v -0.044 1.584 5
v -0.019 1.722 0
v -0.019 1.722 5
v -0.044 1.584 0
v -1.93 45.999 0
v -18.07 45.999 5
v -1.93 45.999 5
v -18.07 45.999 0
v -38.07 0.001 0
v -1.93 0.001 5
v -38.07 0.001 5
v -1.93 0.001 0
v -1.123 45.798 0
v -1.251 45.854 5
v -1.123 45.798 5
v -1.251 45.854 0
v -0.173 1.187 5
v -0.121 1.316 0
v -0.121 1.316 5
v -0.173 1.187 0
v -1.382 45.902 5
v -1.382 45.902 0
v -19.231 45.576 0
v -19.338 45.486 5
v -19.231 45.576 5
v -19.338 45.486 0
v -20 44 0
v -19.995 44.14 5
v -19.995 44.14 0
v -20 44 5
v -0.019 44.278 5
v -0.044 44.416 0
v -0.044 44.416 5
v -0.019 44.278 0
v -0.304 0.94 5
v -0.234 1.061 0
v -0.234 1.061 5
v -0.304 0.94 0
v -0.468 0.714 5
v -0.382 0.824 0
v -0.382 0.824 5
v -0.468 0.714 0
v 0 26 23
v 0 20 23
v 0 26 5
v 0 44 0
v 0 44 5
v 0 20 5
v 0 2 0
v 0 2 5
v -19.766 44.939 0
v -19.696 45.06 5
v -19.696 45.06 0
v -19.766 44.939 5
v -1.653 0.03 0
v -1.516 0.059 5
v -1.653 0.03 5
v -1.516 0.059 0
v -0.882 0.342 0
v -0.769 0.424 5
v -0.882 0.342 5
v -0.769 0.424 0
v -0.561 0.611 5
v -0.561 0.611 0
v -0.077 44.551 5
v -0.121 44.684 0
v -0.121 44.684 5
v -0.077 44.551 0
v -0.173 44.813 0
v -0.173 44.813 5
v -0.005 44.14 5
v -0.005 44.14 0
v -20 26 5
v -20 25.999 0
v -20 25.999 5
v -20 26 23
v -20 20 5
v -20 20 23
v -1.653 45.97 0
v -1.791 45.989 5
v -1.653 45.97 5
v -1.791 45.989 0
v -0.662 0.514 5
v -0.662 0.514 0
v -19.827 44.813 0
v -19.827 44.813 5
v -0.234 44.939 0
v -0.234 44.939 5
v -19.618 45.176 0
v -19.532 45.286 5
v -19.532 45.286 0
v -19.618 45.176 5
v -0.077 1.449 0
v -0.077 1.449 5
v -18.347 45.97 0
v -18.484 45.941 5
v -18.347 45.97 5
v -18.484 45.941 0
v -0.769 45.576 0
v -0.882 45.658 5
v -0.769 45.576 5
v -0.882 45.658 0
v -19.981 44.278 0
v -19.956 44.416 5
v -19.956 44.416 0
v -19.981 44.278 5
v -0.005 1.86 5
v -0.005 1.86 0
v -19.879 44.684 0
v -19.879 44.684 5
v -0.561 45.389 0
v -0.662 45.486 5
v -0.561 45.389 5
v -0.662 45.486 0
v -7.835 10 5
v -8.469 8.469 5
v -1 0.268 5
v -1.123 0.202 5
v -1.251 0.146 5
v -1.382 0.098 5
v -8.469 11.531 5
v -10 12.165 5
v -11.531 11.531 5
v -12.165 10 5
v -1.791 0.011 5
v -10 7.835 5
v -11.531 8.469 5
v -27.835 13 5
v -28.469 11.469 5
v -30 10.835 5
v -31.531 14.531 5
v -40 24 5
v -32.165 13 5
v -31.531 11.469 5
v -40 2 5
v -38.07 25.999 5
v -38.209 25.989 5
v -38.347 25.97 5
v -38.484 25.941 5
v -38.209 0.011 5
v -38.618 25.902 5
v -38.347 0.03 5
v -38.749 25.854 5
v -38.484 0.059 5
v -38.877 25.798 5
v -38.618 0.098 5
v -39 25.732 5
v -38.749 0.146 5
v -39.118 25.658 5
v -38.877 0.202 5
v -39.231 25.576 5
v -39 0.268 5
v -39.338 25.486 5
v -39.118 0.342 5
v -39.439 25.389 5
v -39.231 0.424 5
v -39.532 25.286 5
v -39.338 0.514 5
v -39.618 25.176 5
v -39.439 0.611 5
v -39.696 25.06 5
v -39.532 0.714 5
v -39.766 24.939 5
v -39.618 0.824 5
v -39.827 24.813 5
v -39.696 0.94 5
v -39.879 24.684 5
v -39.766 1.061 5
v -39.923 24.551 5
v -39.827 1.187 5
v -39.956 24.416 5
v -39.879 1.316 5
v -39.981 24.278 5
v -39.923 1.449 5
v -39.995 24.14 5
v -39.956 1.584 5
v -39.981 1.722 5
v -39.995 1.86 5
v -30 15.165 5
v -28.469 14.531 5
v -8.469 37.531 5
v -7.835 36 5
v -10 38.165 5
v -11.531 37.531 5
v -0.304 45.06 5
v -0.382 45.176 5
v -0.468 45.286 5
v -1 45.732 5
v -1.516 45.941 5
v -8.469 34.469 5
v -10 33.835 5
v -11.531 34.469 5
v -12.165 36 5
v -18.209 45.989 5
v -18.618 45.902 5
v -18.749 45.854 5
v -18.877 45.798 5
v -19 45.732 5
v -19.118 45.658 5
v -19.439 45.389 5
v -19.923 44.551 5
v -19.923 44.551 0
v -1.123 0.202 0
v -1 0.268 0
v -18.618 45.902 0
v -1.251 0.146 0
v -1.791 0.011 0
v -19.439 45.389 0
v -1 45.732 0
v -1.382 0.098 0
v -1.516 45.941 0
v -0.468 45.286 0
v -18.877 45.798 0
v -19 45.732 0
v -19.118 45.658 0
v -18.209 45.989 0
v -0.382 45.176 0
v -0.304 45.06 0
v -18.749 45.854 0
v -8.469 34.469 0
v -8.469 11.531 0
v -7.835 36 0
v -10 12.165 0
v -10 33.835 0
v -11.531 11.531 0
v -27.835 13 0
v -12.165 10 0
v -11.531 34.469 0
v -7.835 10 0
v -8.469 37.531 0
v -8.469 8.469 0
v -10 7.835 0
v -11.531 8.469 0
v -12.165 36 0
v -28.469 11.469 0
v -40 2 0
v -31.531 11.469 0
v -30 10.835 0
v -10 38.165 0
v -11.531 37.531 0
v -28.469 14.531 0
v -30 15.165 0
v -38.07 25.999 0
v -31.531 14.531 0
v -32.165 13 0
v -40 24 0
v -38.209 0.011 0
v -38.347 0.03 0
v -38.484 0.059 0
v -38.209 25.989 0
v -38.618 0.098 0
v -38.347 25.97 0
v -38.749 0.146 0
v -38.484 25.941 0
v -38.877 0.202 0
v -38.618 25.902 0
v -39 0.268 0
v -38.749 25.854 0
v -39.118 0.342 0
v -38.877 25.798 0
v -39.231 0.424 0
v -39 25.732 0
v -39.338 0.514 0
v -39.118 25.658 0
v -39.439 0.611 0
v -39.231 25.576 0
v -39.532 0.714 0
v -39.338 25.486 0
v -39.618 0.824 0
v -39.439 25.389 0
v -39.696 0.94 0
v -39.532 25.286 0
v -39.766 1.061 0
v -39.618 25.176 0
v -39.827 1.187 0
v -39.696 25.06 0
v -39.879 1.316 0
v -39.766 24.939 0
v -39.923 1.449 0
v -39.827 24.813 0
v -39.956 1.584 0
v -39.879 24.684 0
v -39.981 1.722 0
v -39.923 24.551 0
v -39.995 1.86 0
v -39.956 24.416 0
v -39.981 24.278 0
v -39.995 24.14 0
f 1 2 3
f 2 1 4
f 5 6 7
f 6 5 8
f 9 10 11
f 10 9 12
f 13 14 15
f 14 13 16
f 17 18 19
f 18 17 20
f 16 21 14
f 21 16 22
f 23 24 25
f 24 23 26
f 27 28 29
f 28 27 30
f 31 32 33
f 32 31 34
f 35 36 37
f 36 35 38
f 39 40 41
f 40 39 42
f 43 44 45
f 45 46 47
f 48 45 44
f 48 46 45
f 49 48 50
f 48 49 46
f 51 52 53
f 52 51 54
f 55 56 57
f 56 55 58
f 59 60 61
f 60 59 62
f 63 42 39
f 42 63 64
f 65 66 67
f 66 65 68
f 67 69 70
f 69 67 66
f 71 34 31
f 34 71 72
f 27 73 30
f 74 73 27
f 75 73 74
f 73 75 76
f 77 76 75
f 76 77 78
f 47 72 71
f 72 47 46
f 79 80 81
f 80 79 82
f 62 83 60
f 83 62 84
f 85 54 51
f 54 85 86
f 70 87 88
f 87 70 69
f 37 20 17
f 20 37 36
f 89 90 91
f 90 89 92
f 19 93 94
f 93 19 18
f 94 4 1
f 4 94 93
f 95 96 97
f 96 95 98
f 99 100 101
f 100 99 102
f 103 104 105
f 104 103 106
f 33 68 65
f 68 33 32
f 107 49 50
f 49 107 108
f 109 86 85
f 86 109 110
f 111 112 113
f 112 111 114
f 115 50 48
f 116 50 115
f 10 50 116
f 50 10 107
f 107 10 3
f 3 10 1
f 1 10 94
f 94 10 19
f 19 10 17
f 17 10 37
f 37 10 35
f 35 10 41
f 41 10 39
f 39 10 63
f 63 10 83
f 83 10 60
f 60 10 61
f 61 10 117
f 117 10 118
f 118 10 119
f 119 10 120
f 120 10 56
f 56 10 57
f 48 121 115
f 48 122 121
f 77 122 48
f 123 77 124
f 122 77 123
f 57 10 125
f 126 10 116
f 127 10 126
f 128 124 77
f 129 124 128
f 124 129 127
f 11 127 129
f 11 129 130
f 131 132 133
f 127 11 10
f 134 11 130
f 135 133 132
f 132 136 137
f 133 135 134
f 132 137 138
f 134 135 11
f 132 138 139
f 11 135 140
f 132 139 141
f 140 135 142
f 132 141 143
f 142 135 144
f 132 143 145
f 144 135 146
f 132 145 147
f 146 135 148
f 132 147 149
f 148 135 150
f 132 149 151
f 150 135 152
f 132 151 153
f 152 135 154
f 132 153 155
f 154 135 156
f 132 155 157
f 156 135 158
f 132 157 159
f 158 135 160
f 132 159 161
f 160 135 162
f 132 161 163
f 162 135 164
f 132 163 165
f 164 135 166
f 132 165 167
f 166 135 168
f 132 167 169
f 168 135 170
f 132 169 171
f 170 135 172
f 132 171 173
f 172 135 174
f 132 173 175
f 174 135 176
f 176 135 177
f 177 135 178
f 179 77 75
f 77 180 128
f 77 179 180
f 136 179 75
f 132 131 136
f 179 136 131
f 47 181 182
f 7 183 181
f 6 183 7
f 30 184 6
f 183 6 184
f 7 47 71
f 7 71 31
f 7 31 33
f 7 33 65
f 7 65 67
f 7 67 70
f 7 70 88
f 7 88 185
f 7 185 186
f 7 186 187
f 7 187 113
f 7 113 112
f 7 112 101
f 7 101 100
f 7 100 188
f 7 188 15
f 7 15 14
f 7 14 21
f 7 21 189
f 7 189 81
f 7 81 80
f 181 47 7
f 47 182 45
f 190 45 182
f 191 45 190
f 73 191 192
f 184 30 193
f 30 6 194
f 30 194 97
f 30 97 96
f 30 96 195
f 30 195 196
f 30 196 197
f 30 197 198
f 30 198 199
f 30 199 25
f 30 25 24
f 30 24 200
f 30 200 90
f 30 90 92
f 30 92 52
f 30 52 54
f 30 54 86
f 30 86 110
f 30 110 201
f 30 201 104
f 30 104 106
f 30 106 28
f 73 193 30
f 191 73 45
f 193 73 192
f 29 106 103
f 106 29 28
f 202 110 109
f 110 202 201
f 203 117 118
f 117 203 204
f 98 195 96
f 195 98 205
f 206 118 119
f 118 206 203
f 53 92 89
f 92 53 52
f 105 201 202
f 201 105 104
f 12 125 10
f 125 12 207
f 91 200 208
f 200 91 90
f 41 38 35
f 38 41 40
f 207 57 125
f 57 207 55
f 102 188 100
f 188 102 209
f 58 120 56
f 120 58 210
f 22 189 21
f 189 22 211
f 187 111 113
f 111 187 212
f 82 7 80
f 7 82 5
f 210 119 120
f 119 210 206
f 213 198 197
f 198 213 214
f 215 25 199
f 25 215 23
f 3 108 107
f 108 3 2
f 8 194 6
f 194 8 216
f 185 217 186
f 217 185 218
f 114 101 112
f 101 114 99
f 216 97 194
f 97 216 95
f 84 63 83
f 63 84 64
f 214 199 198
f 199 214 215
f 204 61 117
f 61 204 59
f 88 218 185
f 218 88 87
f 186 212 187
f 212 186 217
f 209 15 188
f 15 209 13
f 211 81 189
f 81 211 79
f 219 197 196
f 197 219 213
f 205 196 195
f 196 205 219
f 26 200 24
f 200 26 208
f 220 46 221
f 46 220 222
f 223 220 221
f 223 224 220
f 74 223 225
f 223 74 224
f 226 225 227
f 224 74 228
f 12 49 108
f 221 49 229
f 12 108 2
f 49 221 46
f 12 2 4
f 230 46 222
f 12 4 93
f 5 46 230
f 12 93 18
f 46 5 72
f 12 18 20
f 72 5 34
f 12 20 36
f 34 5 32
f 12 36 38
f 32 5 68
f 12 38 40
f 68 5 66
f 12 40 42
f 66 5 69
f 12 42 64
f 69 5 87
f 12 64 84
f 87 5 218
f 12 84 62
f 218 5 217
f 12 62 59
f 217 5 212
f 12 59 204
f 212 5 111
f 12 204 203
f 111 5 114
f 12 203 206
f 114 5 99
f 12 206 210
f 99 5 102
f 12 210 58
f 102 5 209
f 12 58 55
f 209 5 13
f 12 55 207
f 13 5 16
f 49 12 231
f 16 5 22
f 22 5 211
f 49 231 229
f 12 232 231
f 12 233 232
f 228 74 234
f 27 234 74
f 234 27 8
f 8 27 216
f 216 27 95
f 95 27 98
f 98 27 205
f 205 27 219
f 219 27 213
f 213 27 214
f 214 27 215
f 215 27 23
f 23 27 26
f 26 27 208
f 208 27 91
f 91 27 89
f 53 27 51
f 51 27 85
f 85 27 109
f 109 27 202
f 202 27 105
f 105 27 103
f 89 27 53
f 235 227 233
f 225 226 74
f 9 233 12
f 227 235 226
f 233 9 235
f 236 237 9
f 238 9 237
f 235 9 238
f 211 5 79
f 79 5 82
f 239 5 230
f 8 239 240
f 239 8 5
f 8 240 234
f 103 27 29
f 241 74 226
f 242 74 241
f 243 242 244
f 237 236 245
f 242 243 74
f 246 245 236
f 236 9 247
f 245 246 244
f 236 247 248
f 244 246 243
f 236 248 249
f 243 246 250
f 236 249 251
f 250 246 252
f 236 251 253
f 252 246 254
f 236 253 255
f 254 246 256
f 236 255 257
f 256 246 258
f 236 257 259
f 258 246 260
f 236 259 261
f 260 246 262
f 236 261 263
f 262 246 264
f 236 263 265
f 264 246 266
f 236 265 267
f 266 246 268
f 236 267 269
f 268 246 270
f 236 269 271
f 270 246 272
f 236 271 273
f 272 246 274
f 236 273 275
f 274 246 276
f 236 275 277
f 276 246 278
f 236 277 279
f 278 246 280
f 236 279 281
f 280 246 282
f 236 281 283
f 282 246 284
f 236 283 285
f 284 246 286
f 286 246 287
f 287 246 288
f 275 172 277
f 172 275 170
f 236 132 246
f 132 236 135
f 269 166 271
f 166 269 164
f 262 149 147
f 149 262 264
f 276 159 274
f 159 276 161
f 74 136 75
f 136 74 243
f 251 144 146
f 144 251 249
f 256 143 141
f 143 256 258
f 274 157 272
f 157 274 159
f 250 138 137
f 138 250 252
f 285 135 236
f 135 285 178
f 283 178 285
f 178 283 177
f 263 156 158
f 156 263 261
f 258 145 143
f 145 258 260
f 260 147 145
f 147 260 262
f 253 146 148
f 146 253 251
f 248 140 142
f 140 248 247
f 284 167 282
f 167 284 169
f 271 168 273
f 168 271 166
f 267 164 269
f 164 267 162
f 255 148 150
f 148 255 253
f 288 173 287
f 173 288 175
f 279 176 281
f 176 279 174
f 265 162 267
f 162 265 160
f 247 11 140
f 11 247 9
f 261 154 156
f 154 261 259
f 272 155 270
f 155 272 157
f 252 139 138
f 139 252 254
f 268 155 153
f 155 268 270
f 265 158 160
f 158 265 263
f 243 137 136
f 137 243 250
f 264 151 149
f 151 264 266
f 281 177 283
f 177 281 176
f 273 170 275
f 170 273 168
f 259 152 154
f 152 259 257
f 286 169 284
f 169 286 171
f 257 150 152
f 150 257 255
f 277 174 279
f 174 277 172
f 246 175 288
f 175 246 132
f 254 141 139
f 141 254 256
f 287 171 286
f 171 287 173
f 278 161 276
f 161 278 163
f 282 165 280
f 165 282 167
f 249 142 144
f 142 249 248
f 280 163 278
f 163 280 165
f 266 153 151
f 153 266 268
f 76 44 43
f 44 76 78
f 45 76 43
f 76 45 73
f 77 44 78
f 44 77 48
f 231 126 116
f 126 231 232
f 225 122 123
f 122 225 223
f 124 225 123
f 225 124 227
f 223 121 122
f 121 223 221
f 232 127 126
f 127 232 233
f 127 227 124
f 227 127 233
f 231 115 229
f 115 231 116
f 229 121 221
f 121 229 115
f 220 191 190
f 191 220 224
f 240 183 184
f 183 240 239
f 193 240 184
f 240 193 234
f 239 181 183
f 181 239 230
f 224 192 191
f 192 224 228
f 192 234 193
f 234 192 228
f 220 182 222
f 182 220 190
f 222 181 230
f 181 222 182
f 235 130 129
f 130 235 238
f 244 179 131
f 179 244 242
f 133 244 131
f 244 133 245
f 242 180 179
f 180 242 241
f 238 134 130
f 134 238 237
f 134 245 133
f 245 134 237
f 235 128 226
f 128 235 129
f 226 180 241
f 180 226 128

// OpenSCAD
// file: polyhole.scad
// The Cylinder is dead! Long live the Cylinder!
// A module for a polyhole by radius, based on Nophead's work.

module polyhole(h, r, cent = false)
{
    n = max(round(4 * r), 3);
    cylinder(h = h, r = r / cos(180 / n), $fn = n, center = cent);
}
// file: LBracket.scad
// L bracket 

use<polyhole.scad>

LBracket();

module LBracket()
{
    difference()
    {
        union()
        {
            hull()
            {
                translate([2, 2, 0])
                    cylinder(h = 5, r = 2, $fn = 90);
                translate([2, 46-2, 0])
                    cylinder(h = 5, r = 2, $fn = 90);
                translate([20-2, 2, 0])
                    cylinder(h = 5, r = 2, $fn = 90);
                translate([20-2, 46-2, 0])
                    cylinder(h = 5, r = 2, $fn = 90);
            }
            hull()
            {
                translate([2, 2, 0])
                    cylinder(h = 5, r = 2, $fn = 90);
                translate([2, 26-2, 0])
                    cylinder(h = 5, r = 2, $fn = 90);
                translate([40-2, 2, 0])
                    cylinder(h = 5, r = 2, $fn = 90);
                translate([40-2, 26-2, 0])
                    cylinder(h = 5, r = 2, $fn = 90);
            }
            translate([10, 23, (5+18)/2])
                cube([20, 6, 5+18], center = true);
        }
        translate([10, 10, 0])
            polyhole(5, 2);
        translate([10, 46-10, 0])
            polyhole(5, 2);
        translate([40-10, 26/2, 0])
            polyhole(5, 2);
    }
}
// main file
use<LBracket.scad>

LBracketMirror();

module LBracketMirror()
{
    scale([-1, 1, 1])
        LBracket();
}
